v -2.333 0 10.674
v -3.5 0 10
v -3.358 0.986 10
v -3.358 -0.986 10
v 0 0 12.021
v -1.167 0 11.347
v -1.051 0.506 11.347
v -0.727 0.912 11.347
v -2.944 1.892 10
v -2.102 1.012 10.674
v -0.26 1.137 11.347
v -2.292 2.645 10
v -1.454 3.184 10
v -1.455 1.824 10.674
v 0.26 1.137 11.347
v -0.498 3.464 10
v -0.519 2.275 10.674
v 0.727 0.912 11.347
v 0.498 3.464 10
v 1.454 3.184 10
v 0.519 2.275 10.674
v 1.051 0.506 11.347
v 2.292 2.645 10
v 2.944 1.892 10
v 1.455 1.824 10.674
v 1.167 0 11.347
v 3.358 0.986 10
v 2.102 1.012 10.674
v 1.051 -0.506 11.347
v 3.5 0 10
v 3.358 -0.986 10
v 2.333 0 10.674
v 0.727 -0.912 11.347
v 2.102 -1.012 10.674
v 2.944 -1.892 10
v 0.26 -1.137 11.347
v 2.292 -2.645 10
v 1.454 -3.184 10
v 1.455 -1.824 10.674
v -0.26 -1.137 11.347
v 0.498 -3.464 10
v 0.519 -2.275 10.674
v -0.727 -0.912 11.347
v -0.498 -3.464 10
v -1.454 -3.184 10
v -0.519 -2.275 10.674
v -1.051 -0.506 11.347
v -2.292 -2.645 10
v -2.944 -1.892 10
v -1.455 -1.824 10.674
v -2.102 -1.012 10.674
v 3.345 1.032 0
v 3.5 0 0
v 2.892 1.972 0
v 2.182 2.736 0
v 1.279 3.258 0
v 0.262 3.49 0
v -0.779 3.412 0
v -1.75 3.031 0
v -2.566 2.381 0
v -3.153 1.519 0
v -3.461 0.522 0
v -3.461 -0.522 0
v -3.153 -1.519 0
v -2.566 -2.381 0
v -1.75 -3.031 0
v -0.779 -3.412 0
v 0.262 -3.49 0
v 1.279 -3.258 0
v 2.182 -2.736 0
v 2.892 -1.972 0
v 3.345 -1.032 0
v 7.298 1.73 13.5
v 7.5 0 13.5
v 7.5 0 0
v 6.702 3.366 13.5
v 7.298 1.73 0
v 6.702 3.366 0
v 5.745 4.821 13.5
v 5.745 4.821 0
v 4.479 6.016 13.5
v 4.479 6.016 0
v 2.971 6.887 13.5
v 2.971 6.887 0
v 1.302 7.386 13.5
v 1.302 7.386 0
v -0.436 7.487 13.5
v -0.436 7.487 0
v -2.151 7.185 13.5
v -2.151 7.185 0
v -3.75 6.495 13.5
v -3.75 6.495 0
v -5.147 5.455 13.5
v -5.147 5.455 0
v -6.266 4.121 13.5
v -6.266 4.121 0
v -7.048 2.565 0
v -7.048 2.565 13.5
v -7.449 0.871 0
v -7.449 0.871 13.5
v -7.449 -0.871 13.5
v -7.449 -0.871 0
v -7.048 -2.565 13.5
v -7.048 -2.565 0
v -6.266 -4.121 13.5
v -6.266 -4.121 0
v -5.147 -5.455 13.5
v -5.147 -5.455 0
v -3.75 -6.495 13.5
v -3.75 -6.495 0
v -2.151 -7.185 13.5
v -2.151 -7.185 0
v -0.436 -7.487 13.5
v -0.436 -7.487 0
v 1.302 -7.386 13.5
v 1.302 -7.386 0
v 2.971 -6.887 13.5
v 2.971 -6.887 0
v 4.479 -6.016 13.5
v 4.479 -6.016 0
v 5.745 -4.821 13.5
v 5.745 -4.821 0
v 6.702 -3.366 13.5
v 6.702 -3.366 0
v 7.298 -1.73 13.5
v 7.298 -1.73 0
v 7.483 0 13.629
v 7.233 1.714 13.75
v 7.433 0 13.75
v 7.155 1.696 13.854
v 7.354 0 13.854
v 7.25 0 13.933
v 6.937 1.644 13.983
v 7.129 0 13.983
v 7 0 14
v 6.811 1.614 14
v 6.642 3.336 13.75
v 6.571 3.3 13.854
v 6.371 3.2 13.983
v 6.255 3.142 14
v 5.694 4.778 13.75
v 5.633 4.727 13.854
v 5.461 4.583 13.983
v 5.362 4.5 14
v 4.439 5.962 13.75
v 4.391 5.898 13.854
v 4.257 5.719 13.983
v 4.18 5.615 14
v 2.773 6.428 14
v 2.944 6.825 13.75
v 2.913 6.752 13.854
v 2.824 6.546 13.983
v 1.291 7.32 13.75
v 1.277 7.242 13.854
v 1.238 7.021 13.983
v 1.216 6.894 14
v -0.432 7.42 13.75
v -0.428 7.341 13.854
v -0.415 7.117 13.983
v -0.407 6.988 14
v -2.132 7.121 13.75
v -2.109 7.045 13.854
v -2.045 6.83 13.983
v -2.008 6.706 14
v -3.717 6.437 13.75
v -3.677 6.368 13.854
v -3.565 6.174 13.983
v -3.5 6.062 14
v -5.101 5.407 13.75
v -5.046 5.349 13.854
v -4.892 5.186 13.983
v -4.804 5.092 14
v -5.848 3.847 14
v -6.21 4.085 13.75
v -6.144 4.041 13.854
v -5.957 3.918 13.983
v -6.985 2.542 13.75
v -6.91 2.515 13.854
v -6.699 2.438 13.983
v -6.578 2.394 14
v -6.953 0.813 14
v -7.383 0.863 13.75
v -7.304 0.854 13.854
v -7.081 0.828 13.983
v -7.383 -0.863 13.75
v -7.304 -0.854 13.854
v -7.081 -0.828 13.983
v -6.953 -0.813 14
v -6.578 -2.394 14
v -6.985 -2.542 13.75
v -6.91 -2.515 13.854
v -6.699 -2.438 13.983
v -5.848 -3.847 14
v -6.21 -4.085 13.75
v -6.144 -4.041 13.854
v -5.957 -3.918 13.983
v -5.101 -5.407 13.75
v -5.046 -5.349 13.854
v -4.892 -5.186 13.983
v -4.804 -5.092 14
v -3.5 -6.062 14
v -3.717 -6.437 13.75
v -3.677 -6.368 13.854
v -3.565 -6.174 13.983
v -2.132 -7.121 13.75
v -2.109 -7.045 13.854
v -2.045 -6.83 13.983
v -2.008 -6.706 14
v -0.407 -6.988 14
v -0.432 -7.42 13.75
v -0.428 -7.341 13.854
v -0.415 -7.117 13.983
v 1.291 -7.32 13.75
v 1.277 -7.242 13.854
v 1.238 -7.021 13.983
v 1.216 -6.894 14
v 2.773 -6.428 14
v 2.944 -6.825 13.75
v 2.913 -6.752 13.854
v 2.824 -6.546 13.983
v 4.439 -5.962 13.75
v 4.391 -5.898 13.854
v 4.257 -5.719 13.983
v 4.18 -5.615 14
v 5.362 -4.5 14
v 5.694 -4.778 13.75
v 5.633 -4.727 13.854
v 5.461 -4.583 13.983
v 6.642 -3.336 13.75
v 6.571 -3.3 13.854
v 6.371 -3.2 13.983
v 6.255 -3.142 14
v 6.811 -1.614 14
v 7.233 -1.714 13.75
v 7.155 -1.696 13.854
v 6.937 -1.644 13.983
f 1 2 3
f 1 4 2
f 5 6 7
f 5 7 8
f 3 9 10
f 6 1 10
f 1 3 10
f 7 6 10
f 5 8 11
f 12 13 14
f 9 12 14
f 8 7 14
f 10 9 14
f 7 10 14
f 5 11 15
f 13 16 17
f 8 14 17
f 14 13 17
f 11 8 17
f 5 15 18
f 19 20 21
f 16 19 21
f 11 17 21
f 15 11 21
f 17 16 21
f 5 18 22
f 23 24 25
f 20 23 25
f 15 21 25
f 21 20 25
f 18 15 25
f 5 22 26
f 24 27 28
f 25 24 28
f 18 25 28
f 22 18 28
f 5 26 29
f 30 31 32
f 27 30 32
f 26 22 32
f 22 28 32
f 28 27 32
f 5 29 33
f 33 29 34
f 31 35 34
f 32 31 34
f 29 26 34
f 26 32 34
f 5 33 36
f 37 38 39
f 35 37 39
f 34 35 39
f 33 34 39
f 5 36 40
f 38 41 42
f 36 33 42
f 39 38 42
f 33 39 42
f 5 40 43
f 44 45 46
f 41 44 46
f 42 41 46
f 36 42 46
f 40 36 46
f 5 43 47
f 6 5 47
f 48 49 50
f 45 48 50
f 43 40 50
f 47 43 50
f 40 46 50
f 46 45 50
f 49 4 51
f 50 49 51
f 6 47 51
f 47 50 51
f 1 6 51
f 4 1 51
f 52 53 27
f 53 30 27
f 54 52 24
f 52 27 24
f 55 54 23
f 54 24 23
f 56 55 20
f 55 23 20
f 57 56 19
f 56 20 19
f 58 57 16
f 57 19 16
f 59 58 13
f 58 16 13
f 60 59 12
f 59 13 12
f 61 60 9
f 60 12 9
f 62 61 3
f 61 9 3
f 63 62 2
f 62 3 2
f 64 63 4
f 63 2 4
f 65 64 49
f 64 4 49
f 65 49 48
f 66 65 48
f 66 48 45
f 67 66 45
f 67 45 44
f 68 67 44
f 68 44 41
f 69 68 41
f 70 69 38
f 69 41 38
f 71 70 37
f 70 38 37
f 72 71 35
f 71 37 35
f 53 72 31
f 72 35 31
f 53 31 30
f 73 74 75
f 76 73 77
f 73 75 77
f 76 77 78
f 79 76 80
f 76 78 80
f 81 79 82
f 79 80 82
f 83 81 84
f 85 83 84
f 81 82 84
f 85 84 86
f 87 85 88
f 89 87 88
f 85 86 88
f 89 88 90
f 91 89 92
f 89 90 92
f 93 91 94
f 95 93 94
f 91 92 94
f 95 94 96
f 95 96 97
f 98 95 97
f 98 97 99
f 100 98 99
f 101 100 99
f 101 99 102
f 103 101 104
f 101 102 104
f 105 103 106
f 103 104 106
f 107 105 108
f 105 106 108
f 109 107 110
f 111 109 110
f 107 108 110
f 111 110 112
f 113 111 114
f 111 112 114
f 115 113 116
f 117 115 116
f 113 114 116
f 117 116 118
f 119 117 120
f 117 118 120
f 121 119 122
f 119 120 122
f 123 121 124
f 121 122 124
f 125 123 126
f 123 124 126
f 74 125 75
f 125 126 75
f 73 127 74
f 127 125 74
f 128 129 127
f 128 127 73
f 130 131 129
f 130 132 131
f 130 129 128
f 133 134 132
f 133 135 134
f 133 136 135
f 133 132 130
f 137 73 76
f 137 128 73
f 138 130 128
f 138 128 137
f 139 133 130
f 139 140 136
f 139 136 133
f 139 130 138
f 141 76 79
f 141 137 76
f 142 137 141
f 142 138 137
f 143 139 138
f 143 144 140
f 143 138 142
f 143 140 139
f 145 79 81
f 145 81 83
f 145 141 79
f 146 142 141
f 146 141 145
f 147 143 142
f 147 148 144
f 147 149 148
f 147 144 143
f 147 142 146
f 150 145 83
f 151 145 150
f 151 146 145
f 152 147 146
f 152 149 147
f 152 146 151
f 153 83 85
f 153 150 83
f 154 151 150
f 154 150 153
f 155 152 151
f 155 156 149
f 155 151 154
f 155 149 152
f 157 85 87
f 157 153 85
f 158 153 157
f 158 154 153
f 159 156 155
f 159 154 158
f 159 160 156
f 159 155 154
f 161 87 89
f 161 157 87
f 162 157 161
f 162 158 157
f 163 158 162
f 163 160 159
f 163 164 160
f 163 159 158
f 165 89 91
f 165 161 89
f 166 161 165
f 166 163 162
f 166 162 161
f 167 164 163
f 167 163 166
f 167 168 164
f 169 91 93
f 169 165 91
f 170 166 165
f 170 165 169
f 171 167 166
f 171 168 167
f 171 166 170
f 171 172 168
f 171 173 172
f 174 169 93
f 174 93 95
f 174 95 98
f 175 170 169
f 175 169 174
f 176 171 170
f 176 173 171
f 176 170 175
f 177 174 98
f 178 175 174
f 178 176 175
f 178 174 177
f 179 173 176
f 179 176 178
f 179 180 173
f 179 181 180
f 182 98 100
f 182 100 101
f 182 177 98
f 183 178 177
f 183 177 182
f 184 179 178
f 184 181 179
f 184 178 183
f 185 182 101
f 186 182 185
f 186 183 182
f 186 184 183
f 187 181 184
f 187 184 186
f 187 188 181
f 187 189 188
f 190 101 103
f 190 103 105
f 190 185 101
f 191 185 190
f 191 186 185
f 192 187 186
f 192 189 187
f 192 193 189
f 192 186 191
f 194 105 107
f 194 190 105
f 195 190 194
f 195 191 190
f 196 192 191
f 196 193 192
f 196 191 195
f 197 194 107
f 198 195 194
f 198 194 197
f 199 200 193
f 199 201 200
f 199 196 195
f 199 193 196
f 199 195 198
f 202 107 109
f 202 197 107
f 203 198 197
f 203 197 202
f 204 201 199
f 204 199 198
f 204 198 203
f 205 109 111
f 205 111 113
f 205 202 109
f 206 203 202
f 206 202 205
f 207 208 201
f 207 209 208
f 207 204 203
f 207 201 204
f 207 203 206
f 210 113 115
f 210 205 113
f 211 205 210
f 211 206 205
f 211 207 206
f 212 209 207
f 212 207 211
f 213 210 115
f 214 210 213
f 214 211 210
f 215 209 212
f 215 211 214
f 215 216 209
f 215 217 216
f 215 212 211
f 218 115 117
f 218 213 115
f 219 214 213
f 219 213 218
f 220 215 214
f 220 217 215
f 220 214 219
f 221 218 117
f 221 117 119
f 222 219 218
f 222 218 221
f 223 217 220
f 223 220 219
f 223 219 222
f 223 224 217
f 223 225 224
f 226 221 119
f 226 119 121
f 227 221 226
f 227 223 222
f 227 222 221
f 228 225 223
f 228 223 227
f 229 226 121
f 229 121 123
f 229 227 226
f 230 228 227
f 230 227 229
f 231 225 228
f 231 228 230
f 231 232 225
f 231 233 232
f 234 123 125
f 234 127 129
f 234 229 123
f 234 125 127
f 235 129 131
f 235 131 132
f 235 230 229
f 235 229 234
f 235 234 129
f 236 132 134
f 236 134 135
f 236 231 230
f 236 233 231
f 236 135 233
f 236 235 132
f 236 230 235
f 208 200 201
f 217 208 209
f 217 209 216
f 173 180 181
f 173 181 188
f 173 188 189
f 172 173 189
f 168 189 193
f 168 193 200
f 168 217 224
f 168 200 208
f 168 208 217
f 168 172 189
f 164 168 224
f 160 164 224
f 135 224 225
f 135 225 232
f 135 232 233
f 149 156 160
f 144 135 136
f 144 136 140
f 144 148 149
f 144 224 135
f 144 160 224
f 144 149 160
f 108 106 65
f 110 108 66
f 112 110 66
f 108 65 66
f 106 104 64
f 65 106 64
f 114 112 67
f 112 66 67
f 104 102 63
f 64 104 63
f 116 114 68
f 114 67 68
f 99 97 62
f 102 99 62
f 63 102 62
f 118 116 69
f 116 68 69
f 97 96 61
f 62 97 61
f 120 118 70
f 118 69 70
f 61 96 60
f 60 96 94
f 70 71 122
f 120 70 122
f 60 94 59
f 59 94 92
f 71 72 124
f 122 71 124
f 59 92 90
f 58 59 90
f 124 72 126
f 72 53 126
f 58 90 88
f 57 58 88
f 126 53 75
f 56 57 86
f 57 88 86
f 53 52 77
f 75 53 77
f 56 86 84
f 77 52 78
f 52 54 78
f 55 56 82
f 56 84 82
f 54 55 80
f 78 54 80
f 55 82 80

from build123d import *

# Parameters (mm, degrees)
SKETCH1_R                 = 7.5
BOSS_EXTRUDE1_DEPTH       = 14
M8X1_0_TAPPED_HOLE1_D     = 7
M8X1_0_TAPPED_HOLE1_DEPTH = 10
M8X1_0_TAPPED_HOLE1_TIP   = 2.020725942
FILLET1_R                 = 0.5


with BuildPart() as part:
    # Sketch1 → Boss-Extrude1 (new body)
    with BuildSketch(Plane.XY):
        Circle(SKETCH1_R)
    extrude(amount=BOSS_EXTRUDE1_DEPTH)

    # M8x1.0 Tapped Hole1
    with Locations(Plane(origin=(0, 0, 0), x_dir=(-1, 0, 0), z_dir=(0, 0, -1))):
        with Locations((0, 0)):
            Hole(M8X1_0_TAPPED_HOLE1_D / 2, depth=M8X1_0_TAPPED_HOLE1_DEPTH)
            with Locations((0, 0, -(M8X1_0_TAPPED_HOLE1_DEPTH + M8X1_0_TAPPED_HOLE1_TIP / 2))):  # 120° drill point
                Cone(0, M8X1_0_TAPPED_HOLE1_D / 2, M8X1_0_TAPPED_HOLE1_TIP, mode=Mode.SUBTRACT)

    # Fillet1
    fillet1_edges = [part.edges().sort_by_distance(p)[0] for p in [
        (-7.5, 0, 14),
    ]]
    fillet(fillet1_edges, radius=FILLET1_R)


solid = part.part
